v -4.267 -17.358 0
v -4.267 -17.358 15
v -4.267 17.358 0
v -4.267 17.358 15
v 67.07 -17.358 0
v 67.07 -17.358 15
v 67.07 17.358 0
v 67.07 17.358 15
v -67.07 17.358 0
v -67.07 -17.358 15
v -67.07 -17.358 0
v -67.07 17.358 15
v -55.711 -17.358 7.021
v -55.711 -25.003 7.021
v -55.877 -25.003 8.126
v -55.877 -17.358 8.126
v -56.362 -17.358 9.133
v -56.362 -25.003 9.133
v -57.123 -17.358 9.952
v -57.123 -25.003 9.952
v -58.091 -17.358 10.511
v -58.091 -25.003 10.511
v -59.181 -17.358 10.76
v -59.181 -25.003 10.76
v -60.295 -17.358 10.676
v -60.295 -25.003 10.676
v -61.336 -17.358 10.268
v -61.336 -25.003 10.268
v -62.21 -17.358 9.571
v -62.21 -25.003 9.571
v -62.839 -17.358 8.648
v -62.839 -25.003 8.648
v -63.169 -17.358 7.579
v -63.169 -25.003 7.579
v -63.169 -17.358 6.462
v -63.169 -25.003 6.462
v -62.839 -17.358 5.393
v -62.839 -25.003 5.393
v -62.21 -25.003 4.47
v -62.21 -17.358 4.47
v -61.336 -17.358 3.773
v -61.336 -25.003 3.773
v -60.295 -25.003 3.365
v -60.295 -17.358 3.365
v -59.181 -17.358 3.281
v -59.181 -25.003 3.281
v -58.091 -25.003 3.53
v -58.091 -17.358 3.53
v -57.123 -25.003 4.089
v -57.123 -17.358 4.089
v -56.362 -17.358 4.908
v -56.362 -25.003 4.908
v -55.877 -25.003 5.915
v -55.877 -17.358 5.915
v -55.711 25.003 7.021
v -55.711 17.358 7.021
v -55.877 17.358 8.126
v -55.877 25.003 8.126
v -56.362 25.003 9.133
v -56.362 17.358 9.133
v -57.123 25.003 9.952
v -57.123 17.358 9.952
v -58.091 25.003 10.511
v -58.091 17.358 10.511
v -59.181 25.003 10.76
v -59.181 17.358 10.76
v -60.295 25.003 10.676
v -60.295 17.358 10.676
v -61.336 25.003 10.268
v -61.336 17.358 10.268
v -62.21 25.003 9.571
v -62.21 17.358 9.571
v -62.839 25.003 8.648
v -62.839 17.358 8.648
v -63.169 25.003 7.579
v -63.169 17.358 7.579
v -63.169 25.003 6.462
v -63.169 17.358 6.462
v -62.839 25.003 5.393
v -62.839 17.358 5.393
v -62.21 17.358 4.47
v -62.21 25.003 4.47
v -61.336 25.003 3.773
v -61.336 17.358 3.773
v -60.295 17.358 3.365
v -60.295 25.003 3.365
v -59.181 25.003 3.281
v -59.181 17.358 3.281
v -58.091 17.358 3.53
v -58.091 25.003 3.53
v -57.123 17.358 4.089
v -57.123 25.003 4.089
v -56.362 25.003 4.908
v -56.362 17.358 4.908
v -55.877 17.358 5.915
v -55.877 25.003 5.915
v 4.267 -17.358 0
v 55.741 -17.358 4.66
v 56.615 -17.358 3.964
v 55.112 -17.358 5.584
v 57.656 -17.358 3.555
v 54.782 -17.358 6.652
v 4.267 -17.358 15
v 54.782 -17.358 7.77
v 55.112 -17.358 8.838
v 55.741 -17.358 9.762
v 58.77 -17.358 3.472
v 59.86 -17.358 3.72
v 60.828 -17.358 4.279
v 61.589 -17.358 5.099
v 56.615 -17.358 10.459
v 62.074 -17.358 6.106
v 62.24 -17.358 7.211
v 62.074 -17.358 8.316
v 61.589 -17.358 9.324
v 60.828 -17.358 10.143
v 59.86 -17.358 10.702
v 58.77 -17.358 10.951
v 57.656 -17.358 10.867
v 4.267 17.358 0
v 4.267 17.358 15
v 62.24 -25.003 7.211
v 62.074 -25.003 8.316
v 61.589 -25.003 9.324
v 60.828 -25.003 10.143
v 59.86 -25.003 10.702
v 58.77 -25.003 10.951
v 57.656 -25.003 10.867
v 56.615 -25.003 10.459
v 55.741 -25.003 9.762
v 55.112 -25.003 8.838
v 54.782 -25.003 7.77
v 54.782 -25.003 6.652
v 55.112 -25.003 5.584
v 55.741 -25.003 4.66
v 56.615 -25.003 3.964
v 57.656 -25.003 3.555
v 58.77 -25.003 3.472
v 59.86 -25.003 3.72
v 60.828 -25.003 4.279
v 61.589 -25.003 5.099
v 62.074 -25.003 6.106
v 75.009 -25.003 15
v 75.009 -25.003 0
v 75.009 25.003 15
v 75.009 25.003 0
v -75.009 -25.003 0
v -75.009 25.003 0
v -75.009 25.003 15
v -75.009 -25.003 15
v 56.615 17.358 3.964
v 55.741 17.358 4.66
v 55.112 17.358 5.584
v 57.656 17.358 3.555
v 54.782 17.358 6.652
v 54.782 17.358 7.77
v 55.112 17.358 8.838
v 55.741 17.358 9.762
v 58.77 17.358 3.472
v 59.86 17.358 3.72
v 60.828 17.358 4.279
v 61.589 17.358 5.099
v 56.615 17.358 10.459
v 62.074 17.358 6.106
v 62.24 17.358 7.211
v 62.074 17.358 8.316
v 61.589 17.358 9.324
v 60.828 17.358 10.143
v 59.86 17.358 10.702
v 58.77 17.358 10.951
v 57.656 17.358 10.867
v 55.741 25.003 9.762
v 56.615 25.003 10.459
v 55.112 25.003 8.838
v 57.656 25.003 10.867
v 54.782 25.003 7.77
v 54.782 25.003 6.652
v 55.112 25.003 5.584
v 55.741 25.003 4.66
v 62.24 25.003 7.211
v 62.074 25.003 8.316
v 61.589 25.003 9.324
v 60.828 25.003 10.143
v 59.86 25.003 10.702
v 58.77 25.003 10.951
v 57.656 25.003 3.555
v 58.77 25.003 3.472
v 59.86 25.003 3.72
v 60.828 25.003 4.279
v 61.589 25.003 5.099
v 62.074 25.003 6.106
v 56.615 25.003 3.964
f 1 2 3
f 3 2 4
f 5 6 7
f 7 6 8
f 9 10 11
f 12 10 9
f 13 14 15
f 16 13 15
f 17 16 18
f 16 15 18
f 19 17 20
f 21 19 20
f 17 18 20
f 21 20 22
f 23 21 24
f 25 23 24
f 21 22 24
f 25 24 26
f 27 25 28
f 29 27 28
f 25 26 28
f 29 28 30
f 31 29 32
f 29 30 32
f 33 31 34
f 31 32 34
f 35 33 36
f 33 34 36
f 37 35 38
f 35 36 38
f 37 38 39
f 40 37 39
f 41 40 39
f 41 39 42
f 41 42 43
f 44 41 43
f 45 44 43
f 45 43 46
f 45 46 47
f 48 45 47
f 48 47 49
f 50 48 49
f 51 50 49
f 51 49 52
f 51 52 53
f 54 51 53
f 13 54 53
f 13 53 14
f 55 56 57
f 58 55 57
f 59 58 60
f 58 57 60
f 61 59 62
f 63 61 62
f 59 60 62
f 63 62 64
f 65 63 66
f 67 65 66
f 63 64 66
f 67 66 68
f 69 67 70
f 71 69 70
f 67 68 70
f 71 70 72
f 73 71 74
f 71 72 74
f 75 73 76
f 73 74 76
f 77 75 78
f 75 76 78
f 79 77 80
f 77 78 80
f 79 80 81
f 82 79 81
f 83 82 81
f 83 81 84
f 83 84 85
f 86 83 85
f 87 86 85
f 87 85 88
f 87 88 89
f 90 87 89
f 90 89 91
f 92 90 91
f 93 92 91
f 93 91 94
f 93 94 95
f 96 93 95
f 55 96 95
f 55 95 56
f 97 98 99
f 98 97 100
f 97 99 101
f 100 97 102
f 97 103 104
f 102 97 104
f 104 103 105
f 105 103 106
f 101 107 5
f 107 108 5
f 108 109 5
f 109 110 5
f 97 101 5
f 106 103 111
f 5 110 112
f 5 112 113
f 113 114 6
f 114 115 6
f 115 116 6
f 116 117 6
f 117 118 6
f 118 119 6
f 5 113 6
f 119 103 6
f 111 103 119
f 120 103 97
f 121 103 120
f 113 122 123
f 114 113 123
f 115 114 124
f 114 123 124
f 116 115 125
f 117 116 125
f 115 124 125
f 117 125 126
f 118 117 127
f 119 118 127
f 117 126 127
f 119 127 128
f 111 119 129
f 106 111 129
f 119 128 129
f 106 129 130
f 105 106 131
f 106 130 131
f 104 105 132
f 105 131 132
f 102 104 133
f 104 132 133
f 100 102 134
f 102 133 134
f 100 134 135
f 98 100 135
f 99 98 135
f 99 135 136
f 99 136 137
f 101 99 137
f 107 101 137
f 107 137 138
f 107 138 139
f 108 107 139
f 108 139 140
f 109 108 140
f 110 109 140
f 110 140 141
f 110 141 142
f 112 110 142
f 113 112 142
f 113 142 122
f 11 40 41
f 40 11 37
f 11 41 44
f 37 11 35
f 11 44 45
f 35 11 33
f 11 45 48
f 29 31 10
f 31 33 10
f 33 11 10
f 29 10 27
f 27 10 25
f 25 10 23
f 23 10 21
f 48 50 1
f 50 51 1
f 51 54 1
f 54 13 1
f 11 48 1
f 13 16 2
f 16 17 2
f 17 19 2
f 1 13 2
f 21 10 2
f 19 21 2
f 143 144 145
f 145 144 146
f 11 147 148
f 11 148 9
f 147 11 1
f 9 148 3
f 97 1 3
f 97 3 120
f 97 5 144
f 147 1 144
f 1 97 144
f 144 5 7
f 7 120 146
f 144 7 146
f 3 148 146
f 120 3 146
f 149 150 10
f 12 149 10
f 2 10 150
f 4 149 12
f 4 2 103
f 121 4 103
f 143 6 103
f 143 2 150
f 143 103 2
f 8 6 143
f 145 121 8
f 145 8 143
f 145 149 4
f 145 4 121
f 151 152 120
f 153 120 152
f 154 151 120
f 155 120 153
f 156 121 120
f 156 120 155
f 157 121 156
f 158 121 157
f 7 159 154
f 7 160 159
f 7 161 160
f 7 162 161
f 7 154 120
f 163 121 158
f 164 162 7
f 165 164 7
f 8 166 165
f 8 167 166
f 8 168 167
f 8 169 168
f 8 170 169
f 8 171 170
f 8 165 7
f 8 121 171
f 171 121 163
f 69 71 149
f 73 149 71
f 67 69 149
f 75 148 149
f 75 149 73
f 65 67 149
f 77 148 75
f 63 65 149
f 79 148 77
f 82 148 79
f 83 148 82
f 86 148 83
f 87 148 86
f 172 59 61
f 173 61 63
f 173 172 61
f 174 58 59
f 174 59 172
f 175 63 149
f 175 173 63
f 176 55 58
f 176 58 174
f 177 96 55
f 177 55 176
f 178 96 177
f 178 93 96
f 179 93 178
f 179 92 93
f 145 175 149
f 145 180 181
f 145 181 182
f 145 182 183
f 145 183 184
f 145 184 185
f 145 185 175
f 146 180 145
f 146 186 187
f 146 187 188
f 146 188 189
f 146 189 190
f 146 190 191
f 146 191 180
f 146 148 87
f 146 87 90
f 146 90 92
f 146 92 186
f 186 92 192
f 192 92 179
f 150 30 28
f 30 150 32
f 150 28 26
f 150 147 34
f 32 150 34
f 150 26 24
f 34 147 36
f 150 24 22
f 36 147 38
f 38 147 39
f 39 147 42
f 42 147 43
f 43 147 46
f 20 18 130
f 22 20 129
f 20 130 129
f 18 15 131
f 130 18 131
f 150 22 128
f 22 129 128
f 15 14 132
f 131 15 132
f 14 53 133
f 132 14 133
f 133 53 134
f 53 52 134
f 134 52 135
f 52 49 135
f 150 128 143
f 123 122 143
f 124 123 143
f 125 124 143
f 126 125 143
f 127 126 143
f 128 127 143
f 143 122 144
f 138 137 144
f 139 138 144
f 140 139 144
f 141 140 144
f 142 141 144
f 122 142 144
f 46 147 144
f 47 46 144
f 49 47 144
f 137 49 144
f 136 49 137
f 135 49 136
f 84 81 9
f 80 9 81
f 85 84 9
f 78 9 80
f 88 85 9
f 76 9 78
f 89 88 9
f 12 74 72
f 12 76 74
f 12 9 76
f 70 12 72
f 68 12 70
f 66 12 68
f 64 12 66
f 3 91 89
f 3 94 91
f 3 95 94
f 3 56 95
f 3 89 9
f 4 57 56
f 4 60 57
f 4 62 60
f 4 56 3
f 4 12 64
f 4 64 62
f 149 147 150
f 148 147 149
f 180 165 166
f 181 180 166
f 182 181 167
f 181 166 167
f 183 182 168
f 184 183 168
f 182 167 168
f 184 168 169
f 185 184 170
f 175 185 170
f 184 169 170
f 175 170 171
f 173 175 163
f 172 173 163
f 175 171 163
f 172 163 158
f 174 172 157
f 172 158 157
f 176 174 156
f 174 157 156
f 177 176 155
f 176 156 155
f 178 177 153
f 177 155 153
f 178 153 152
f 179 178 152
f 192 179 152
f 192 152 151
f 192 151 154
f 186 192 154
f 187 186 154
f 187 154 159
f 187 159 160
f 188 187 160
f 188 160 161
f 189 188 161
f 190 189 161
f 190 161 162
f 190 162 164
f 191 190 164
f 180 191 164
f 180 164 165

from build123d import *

# Parameters (mm, degrees)
F0_W     = 150.0187367201
F0_H     = 50.0062517822
F1_DEPTH = 15
F4_W     = 134.1393142939
F4_H     = 34.7154848278
F5_DEPTH = 39.6
F6_W     = 8.5336472839
F6_H     = 34.7154848278
F7_DEPTH = 15
F9_D     = 7.5
F11_D    = 7.5


with BuildPart() as f1:
    # F0 (on Top) → F1 (new body)
    with BuildSketch(Plane.XY):
        Rectangle(F0_W, F0_H)
    extrude(amount=F1_DEPTH)

    # F4 (on face) → F5 (cut)
    with BuildSketch(Plane.XY.offset(15)):
        Rectangle(F4_W, F4_H)
    extrude(amount=-F5_DEPTH, mode=Mode.SUBTRACT)

    # F6 (on face) → F7 (join)
    with BuildSketch(Plane.XY.offset(15)):
        Rectangle(F6_W, F6_H)
    extrude(amount=-F7_DEPTH)

    # F9 (through all)
    with Locations(Plane(origin=(0, 25.0031258911, 0), x_dir=(-1, 0, 0), z_dir=(0, 1, 0))):
        with Locations((-58.490190655, 7.2111194022)):
            Hole(F9_D / 2)

    # F11 (through all)
    with Locations(Plane(origin=(0, 25.0031258911, 0), x_dir=(-1, 0, 0), z_dir=(0, 1, 0))):
        with Locations((59.4607852399, 7.0205056109)):
            Hole(F11_D / 2)


solid = f1.part
